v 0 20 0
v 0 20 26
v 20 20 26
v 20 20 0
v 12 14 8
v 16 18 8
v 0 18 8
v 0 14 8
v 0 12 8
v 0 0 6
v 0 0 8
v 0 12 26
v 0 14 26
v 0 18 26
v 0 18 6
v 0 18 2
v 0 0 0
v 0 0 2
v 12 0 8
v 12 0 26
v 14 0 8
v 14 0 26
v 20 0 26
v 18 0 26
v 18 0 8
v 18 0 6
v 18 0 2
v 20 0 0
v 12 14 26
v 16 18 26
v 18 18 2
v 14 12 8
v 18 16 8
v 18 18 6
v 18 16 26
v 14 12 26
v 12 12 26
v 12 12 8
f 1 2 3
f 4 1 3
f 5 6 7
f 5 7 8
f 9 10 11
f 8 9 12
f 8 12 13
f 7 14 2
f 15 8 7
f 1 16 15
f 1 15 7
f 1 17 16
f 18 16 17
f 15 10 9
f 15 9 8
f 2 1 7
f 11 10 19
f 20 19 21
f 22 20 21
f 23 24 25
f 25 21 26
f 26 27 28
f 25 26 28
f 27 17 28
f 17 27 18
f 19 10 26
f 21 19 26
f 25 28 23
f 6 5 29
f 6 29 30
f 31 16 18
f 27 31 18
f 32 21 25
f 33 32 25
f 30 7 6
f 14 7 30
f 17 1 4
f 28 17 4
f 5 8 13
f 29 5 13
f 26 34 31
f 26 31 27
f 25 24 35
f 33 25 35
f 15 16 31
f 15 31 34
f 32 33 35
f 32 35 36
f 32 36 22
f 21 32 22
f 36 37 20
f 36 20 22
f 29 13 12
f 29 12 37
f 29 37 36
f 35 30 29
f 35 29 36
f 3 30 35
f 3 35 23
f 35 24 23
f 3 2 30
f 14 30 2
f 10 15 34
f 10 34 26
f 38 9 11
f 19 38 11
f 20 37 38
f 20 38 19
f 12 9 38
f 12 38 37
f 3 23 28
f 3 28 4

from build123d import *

# Parameters (mm, degrees)
F0_W     = 20
F0_H     = 20
F1_DEPTH = 26
F2_W     = 12
F2_H     = 18
F3_DEPTH = 12
F4_W     = 18
F4_H     = 4
F5_DEPTH = 18
F6_W     = 4
F6_H     = 18
F7_DEPTH = 12
F9_DEPTH = 18


with BuildPart() as f1:
    # F0 (on Top) → F1 (new body)
    with BuildSketch(Plane.XY):
        with Locations((10, 10)):
            Rectangle(F0_W, F0_H)
    extrude(amount=F1_DEPTH)

    # F2 (on face) → F3 (cut)
    with BuildSketch(Plane(origin=(0, 0, 0), x_dir=(0, -1, 0), z_dir=(-1, 0, 0))):
        with Locations((-6, 17)):
            Rectangle(F2_W, F2_H)
    extrude(amount=-F3_DEPTH, mode=Mode.SUBTRACT)

    # F4 (on face) → F5 (cut)
    with BuildSketch(Plane(origin=(0, 0, 0), x_dir=(0, -1, 0), z_dir=(-1, 0, 0))):
        with Locations((-9, 4)):
            Rectangle(F4_W, F4_H)
    extrude(amount=-F5_DEPTH, mode=Mode.SUBTRACT)

    # F6 (on face) → F7 (cut)
    with BuildSketch(Plane(origin=(0, 0, 0), x_dir=(0, -1, 0), z_dir=(-1, 0, 0))):
        with Locations((-16, 17)):
            Rectangle(F6_W, F6_H)
    extrude(amount=-F7_DEPTH, mode=Mode.SUBTRACT)

    # F8 (on face) → F9 (cut)
    with BuildSketch(Plane.XY.offset(26)):
        Polygon((12, 18), (12, 14), (16, 18), align=None)
        Polygon((18, 16), (14, 12), (14, 0), (18, 0), (18, 12), align=None)
    extrude(amount=-F9_DEPTH, mode=Mode.SUBTRACT)


solid = f1.part
